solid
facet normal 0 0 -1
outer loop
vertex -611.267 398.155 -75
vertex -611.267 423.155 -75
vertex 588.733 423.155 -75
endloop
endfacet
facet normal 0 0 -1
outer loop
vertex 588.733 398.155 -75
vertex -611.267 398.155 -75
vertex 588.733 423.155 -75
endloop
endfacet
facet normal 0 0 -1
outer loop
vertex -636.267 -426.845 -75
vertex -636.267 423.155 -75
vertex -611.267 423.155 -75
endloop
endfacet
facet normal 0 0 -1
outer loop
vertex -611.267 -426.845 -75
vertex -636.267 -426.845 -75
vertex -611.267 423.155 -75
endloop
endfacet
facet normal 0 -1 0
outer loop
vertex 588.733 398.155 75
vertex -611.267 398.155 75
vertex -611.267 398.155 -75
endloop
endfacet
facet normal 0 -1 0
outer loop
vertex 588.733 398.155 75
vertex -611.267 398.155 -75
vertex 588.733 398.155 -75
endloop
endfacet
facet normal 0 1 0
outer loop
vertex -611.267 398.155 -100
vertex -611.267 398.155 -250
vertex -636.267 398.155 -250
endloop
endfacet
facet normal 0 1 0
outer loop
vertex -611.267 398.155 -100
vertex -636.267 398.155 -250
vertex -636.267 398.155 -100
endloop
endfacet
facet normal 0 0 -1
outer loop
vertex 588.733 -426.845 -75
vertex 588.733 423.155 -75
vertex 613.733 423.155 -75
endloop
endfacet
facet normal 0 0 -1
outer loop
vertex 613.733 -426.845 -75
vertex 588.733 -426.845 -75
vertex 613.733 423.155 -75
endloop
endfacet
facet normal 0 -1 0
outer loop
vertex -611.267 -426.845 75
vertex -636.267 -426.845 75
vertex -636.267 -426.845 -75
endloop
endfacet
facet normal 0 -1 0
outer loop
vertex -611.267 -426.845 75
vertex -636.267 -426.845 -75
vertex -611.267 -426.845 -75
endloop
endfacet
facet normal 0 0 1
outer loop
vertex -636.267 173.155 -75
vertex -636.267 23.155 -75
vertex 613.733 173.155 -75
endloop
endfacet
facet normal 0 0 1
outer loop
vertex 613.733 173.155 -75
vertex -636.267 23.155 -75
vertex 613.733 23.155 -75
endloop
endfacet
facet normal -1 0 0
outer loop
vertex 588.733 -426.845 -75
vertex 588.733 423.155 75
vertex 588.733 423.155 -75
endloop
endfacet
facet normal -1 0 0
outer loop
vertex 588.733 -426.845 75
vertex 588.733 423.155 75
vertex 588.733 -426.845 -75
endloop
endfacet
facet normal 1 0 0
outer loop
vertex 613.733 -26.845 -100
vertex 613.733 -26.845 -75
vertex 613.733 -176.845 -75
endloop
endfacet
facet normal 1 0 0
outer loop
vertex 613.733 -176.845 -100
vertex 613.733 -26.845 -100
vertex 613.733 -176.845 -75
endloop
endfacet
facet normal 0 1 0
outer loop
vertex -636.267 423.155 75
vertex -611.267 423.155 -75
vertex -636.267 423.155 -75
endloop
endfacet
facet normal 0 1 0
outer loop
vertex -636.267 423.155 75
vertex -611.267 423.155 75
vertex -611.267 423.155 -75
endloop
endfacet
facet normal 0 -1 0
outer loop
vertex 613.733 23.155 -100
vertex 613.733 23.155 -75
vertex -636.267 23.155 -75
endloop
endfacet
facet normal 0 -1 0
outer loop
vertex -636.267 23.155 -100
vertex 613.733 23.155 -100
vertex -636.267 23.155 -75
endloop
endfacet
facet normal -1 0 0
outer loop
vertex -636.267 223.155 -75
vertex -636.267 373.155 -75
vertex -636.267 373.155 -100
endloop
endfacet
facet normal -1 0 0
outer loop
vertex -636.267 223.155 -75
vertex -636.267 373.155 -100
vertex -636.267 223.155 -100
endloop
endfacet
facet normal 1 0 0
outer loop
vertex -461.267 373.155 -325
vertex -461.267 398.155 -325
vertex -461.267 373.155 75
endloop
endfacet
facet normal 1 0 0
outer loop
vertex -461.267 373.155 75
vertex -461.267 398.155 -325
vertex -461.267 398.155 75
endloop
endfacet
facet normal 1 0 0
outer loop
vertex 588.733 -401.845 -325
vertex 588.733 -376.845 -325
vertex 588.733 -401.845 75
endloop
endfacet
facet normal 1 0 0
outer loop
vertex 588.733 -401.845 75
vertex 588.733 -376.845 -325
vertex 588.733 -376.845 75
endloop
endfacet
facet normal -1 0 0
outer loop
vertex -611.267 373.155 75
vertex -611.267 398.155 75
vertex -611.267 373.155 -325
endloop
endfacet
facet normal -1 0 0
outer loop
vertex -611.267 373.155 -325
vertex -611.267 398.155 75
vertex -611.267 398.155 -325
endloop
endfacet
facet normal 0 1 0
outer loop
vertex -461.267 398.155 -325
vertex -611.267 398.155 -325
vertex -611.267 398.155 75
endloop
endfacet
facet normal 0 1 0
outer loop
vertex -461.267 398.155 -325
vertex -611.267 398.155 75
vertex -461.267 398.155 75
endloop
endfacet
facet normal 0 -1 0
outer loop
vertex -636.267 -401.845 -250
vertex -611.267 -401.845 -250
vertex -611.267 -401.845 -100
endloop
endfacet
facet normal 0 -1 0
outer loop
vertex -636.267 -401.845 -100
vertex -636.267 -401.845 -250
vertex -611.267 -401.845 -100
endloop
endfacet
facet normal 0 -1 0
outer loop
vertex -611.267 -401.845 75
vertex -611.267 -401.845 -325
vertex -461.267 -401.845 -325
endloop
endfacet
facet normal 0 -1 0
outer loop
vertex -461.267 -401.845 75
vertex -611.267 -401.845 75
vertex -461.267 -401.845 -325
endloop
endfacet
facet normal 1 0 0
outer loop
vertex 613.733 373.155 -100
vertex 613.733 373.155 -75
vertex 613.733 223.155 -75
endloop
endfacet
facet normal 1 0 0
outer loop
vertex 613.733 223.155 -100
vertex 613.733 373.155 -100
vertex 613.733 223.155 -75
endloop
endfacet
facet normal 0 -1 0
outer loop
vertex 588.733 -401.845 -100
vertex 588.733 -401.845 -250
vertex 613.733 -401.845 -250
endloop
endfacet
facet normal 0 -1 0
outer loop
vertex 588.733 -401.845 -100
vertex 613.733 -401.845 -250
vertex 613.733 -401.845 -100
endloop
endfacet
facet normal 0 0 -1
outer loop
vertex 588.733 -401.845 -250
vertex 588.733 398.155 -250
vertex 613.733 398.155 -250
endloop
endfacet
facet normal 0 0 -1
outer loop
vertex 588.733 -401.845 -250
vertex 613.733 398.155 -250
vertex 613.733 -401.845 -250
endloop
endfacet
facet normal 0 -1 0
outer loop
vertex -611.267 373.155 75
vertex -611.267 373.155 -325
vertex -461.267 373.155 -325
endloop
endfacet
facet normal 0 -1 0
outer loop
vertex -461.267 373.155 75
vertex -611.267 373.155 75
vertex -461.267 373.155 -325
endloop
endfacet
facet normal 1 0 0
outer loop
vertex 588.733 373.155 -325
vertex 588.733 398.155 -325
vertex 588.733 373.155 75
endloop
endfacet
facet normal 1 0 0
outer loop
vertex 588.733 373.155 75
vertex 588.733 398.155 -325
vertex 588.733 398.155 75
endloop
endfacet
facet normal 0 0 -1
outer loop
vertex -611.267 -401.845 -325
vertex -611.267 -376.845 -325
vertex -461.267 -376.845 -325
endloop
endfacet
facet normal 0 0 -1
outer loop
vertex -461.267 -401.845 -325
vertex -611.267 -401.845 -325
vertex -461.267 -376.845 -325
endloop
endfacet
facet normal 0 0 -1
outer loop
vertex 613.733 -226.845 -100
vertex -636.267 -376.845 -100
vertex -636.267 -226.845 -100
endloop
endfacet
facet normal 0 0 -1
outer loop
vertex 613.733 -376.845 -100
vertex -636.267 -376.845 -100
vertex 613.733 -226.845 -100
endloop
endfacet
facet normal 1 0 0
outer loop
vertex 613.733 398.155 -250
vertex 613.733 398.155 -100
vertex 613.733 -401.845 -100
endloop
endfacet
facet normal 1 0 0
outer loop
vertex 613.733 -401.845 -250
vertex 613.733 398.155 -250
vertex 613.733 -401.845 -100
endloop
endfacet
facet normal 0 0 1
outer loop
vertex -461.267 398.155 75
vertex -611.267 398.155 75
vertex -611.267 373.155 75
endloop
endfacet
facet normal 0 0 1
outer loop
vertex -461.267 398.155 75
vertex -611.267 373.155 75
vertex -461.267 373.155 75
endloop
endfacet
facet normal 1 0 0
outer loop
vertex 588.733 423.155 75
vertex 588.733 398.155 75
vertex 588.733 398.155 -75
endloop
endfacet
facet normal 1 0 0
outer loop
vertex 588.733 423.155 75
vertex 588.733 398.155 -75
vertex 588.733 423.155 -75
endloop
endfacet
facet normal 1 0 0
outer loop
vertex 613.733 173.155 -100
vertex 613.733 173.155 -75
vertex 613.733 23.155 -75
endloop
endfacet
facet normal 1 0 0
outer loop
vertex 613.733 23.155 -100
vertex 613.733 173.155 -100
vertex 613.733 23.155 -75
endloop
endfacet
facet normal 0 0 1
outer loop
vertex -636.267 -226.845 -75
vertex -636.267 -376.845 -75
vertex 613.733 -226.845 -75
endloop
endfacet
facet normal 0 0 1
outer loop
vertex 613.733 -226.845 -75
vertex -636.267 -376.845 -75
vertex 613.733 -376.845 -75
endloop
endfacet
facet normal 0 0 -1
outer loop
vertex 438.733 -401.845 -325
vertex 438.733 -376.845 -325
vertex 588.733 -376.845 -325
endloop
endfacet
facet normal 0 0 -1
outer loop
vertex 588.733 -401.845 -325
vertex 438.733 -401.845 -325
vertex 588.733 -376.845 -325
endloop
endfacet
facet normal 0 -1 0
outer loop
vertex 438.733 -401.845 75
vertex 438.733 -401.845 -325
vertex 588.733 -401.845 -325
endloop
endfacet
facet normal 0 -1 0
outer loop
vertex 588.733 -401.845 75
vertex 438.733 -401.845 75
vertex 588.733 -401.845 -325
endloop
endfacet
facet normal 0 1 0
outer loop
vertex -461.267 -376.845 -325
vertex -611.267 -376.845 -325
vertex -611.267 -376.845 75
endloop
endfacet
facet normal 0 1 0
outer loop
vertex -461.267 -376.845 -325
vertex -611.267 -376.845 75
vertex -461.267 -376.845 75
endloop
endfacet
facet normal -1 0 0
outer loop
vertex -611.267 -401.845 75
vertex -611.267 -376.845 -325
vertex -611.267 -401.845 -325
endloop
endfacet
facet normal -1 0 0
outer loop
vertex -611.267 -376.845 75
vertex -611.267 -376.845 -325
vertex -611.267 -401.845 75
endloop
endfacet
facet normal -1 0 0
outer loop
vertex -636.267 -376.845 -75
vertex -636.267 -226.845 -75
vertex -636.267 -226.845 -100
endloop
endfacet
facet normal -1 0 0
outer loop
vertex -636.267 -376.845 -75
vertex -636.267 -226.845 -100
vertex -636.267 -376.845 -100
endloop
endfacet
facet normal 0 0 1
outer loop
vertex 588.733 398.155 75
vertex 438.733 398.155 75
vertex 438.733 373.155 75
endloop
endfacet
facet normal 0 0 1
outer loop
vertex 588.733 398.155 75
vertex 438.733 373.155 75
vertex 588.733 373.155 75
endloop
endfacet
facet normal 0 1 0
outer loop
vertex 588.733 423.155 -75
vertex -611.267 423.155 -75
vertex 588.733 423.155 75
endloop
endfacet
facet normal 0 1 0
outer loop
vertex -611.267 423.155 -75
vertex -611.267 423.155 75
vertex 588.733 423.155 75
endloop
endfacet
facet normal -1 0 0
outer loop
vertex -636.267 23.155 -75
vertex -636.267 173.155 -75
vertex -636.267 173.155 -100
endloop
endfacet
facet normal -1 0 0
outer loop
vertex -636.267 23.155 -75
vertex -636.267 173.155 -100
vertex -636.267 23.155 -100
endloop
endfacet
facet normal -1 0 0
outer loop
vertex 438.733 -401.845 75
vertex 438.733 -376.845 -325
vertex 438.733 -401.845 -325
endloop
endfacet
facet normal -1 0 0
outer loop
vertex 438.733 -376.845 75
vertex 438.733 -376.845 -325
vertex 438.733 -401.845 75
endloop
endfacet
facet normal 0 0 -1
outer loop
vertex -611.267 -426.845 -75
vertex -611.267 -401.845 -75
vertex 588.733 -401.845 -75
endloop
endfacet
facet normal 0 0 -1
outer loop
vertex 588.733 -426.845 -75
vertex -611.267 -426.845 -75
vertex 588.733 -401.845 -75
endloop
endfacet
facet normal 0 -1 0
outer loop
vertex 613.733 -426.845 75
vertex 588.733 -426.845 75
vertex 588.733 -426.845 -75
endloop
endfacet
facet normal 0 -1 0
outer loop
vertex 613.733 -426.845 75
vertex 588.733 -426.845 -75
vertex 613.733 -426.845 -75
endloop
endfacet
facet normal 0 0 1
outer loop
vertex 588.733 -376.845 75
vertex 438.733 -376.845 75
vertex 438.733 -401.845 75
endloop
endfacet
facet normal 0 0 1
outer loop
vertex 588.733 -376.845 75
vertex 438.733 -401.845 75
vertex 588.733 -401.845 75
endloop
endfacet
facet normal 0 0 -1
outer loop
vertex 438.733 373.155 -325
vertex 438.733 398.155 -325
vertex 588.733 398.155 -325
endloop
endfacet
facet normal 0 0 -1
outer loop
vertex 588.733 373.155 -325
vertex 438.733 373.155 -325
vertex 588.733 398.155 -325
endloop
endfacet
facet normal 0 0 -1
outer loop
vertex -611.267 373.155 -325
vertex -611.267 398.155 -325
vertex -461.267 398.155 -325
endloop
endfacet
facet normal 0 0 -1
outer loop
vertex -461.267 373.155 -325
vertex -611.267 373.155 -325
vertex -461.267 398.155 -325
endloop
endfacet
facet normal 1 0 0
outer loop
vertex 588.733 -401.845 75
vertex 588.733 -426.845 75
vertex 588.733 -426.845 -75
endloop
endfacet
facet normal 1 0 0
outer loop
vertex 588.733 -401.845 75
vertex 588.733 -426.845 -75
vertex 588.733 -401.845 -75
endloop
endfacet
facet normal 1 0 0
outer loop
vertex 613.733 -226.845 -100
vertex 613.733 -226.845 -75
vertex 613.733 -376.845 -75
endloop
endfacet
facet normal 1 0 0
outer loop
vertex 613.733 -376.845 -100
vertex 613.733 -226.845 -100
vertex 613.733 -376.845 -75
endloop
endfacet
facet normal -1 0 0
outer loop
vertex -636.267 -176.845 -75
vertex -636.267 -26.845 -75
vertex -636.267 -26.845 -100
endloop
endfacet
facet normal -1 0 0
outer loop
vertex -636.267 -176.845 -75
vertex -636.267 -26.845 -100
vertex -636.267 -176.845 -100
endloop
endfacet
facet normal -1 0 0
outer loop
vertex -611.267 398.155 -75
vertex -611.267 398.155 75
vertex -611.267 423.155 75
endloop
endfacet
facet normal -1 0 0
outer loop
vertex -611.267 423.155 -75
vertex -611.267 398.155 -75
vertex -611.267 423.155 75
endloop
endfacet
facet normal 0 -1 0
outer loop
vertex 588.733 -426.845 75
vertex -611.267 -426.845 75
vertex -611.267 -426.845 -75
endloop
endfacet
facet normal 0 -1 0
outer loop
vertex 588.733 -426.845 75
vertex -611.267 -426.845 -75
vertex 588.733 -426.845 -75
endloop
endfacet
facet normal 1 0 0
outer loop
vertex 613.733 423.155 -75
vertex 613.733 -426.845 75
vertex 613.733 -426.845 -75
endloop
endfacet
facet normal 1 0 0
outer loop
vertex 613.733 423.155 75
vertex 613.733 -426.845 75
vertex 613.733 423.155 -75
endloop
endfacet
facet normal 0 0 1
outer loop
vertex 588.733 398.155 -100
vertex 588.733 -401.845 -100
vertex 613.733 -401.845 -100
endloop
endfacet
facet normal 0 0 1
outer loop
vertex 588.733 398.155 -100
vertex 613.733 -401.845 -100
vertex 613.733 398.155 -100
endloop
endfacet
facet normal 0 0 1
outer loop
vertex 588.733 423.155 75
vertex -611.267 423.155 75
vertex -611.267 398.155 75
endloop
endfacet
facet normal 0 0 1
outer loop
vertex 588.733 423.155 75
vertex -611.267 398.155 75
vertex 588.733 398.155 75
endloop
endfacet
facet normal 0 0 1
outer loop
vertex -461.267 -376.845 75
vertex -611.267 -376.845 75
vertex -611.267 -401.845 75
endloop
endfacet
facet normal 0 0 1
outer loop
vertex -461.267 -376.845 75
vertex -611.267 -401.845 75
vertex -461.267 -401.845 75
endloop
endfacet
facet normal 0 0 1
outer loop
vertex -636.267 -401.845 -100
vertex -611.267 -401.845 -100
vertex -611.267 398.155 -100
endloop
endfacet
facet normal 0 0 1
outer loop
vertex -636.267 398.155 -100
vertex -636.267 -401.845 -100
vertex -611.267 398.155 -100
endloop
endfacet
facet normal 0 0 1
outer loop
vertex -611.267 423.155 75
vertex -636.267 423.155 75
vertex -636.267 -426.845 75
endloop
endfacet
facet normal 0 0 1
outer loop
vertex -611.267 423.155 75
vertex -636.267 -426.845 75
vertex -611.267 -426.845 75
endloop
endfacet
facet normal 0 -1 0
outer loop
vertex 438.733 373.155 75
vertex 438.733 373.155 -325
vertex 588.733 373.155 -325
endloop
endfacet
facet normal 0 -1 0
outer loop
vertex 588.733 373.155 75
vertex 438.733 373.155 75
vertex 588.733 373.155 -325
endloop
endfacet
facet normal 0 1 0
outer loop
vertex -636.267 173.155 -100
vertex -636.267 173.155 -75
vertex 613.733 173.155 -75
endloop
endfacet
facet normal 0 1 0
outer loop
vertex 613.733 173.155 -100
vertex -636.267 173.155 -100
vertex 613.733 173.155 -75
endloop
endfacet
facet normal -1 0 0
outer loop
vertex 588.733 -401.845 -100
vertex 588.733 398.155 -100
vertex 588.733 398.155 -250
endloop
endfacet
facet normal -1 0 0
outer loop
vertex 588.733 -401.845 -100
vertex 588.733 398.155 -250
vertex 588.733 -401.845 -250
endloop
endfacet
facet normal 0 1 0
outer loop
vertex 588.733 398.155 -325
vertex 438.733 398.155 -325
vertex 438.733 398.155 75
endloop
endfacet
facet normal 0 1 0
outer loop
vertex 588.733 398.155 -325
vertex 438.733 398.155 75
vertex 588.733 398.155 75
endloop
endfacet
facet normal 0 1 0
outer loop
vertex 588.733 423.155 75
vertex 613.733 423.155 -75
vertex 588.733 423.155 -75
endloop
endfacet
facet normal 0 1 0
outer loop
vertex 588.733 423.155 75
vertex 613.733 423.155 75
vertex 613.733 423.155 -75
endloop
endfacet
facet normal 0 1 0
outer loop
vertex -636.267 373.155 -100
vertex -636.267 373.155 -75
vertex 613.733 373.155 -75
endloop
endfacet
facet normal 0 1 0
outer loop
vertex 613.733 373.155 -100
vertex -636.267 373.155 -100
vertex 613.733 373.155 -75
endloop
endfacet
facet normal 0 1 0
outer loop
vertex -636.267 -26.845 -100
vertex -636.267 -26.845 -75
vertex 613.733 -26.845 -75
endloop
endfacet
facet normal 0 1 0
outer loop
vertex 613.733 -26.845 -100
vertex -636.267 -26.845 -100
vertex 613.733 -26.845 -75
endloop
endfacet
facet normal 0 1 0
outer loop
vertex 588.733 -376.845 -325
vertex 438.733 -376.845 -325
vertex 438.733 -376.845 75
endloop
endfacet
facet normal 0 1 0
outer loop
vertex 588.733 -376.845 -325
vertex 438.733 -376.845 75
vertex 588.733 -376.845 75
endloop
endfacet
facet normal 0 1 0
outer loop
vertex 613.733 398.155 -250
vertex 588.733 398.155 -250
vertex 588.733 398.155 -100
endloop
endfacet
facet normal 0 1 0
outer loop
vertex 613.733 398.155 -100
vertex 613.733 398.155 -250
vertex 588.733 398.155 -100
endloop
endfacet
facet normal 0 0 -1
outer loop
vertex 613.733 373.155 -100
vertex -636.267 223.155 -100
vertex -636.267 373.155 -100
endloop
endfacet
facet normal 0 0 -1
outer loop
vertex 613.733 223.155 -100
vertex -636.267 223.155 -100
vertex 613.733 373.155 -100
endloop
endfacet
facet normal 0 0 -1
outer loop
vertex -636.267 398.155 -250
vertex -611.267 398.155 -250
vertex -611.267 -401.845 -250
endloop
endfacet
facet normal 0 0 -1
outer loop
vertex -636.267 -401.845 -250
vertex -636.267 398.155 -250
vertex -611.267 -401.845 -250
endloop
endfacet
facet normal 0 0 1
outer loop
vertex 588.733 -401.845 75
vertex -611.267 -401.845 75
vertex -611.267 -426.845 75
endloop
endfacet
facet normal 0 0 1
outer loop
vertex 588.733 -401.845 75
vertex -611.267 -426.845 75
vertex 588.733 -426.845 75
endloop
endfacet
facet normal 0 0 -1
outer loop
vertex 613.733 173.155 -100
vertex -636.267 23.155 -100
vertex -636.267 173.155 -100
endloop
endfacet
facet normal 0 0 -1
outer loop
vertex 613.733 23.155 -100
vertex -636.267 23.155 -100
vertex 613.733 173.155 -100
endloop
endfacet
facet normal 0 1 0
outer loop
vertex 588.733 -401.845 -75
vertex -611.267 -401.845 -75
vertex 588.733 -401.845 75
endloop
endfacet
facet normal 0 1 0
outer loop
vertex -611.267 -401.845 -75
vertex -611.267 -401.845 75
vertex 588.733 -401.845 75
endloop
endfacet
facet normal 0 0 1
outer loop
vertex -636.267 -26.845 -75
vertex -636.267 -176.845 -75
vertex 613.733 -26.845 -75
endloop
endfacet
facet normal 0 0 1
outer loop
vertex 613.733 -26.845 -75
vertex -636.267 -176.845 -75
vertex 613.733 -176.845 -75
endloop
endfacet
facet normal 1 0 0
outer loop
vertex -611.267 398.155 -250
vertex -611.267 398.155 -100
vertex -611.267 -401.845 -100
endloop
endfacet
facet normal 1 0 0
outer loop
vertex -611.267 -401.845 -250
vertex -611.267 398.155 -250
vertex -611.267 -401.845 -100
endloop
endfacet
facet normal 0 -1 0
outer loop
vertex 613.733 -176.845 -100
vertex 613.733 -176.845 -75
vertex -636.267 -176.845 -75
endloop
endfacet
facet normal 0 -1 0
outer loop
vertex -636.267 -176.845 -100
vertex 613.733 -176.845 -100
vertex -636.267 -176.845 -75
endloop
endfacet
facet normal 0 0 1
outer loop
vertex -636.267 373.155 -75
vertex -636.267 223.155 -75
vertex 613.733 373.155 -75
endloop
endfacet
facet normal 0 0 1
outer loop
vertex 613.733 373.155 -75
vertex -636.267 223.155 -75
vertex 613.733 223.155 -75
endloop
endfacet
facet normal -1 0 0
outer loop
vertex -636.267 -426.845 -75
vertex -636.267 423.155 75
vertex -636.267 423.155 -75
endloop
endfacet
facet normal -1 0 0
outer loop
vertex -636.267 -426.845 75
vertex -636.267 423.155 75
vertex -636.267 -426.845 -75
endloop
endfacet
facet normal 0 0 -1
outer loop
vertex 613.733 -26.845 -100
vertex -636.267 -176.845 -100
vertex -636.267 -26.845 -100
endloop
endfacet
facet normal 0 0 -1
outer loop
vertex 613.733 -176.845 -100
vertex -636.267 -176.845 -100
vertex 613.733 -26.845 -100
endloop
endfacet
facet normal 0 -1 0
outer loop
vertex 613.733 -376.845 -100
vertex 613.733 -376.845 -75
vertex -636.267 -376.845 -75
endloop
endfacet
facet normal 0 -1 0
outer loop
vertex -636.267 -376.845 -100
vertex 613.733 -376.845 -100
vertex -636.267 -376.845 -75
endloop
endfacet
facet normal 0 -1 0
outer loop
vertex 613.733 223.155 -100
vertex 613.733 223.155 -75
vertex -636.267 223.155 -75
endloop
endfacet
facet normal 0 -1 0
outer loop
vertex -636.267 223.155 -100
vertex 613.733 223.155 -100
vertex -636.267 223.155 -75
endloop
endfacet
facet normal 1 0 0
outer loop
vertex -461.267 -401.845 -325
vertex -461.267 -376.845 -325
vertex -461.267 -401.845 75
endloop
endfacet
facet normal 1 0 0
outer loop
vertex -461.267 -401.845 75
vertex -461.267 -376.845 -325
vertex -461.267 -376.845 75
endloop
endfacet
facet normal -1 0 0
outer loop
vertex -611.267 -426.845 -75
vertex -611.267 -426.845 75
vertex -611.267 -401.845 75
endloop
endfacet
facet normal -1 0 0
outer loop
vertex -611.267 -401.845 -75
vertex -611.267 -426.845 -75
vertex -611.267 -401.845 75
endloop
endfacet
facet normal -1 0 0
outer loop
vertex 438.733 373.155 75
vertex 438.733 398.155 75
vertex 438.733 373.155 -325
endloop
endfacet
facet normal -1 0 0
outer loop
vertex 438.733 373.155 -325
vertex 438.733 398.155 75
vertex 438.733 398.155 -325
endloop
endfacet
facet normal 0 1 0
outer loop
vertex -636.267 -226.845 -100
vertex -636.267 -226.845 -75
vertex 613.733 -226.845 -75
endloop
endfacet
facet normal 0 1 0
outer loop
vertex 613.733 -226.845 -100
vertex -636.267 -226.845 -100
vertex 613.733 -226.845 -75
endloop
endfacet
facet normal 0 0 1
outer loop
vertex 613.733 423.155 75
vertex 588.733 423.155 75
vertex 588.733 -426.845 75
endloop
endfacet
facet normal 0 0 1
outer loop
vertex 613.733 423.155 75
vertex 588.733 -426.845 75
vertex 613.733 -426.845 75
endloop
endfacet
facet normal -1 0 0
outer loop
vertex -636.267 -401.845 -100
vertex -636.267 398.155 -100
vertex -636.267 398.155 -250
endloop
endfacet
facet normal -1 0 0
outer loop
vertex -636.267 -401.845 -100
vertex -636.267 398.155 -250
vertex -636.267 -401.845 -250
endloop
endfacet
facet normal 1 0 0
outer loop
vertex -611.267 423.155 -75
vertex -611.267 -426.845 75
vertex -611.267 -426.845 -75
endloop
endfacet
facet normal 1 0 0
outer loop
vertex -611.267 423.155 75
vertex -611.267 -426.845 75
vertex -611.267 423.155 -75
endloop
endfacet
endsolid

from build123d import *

# Parameters (mm, degrees)
F1_DEPTH  = 75
F0_W      = 1200
F0_H      = 25
F2_DEPTH  = 75
F3_W      = 150
F3_H      = 250
F3_H_2    = 150
F4_DEPTH  = 25
F5_START  = 750
F4_FACE_W = 150
F4_FACE_H = 400
F5_DEPTH  = 25
F6_W      = 1225
F6_H      = 150
F6_W_2    = 25
F7_DEPTH  = 25
F8_W      = 25
F8_H      = 150
F8_W_2    = 775
F9_DEPTH  = 25
F10_START = -1200
F10_DEPTH = 25
F11_DEPTH = 25


# Not quite as in the source:
# - a feature names something its author has since deleted; it is built from what else it names


with BuildPart() as f1:
    # F0 (on Top) → F1 (new body, symmetric)
    with BuildSketch(Plane.XY):
        Polygon((-611.2673640251, -401.8448650837), (-611.2673640251, 398.1551349163), (-611.2673640251, 423.1551349163), (-636.2673640251, 423.1551349163), (-636.2673640251, -426.8448650837), (-611.2673640251, -426.8448650837), align=None)
    extrude(amount=F1_DEPTH, both=True)


with BuildPart() as f1b:
    # F0 (on Top) → F1, piece 2 (new body, symmetric)
    with BuildSketch(Plane.XY):
        Polygon((588.7326359749, 423.1551349163), (588.7326359749, 398.1551349163), (588.7326359749, -401.8448650837), (588.7326359749, -426.8448650837), (613.7326359749, -426.8448650837), (613.7326359749, 423.1551349163), align=None)
    extrude(amount=F1_DEPTH, both=True)


with BuildPart() as f2:
    # F0 (on Top) → F2 (new body, symmetric)
    with BuildSketch(Plane.XY):
        with Locations((-11.2673640251, 410.6551349163)):
            Rectangle(F0_W, F0_H)
    extrude(amount=F2_DEPTH, both=True)


with BuildPart() as f2b:
    # F0 (on Top) → F2, piece 2 (new body, symmetric)
    with BuildSketch(Plane.XY):
        with Locations((-11.2673640251, -414.3448650837)):
            Rectangle(F0_W, F0_H)
    extrude(amount=F2_DEPTH, both=True)


with BuildPart() as f4:
    # F3 (on face) → F4 (new body)
    with BuildSketch(Plane.XZ.offset(-398.1551349163)):
        with Locations((513.7326359749, -200)):
            Rectangle(F3_W, F3_H)
        with Locations((513.7326359749, 0)):
            Rectangle(F3_W, F3_H_2)
    extrude(amount=F4_DEPTH)


with BuildPart() as f4b:
    # F3 (on face) → F4, piece 2 (new body)
    with BuildSketch(Plane.XZ.offset(-398.1551349163)):
        with Locations((-536.2673640251, 0)):
            Rectangle(F3_W, F3_H_2)
        with Locations((-536.2673640251, -200)):
            Rectangle(F3_W, F3_H)
    extrude(amount=F4_DEPTH)


with BuildPart() as f5:
    # F4_face (on face) → F5 (new body)
    with BuildSketch(Plane(origin=(-536.2673640251, 373.1551349163, -125), x_dir=(1, 0, 0), z_dir=(0, -1, 0)).offset(F5_START)):
        Rectangle(F4_FACE_W, F4_FACE_H)
    extrude(amount=F5_DEPTH)


with BuildPart() as f5b:
    # F4_face (on face) → F5, piece 2 (new body)
    with BuildSketch(Plane(origin=(-536.2673640251, 373.1551349163, -125), x_dir=(1, 0, 0), z_dir=(0, -1, 0)).offset(F5_START)):
        with Locations((1050, 0)):
            Rectangle(F4_FACE_W, F4_FACE_H)
    extrude(amount=F5_DEPTH)


with BuildPart() as f7:
    # F6 (on face) → F7 (new body)
    with BuildSketch(Plane(origin=(0, 0, -75), x_dir=(1, 0, 0), z_dir=(0, 0, -1))):
        with Locations((1.2326359749, -298.1551349163)):
            Rectangle(F6_W, F6_H)
        with Locations((-623.7673640251, -298.1551349163)):
            Rectangle(F6_W_2, F6_H)
    extrude(amount=F7_DEPTH)


with BuildPart() as f7b:
    # F6 (on face) → F7, piece 2 (new body)
    with BuildSketch(Plane(origin=(0, 0, -75), x_dir=(1, 0, 0), z_dir=(0, 0, -1))):
        with Locations((-623.7673640251, 301.8448650837)):
            Rectangle(F6_W_2, F6_H)
        with Locations((1.2326359749, 301.8448650837)):
            Rectangle(F6_W, F6_H)
    extrude(amount=F7_DEPTH)


with BuildPart() as f9:
    # F8 (on face) → F9 (new body)
    with BuildSketch(Plane(origin=(-611.2673640251, 0, 0), x_dir=(0, -1, 0), z_dir=(-1, 0, 0))):
        with Locations((-385.6551349163, -175)):
            Rectangle(F8_W, F8_H)
        with Locations((14.3448650837, -175)):
            Rectangle(F8_W_2, F8_H)
    extrude(amount=F9_DEPTH)


with BuildPart() as f10:
    # F8 (on face) → F10 (new body)
    with BuildSketch(Plane(origin=(-611.2673640251, 0, 0), x_dir=(0, -1, 0), z_dir=(-1, 0, 0)).offset(F10_START)):
        with Locations((14.3448650837, -175)):
            Rectangle(F8_W_2, F8_H)
        with Locations((-385.6551349163, -175)):
            Rectangle(F8_W, F8_H)
    extrude(amount=-F10_DEPTH)


with BuildPart() as f11:
    # F6 (on face) → F11 (new body)
    with BuildSketch(Plane(origin=(0, 0, -75), x_dir=(1, 0, 0), z_dir=(0, 0, -1))):
        with Locations((1.2326359749, 101.8448650837)):
            Rectangle(F6_W, F6_H)
        with Locations((-623.7673640251, 101.8448650837)):
            Rectangle(F6_W_2, F6_H)
    extrude(amount=F11_DEPTH)


with BuildPart() as f11b:
    # F6 (on face) → F11, piece 2 (new body)
    with BuildSketch(Plane(origin=(0, 0, -75), x_dir=(1, 0, 0), z_dir=(0, 0, -1))):
        with Locations((-623.7673640251, -98.1551349163)):
            Rectangle(F6_W_2, F6_H)
        with Locations((1.2326359749, -98.1551349163)):
            Rectangle(F6_W, F6_H)
    extrude(amount=F11_DEPTH)


solid = Compound([f1.part, f1b.part, f2.part, f2b.part, f4.part, f4b.part, f5.part, f5b.part, f7.part, f7b.part, f9.part, f10.part, f11.part, f11b.part])
